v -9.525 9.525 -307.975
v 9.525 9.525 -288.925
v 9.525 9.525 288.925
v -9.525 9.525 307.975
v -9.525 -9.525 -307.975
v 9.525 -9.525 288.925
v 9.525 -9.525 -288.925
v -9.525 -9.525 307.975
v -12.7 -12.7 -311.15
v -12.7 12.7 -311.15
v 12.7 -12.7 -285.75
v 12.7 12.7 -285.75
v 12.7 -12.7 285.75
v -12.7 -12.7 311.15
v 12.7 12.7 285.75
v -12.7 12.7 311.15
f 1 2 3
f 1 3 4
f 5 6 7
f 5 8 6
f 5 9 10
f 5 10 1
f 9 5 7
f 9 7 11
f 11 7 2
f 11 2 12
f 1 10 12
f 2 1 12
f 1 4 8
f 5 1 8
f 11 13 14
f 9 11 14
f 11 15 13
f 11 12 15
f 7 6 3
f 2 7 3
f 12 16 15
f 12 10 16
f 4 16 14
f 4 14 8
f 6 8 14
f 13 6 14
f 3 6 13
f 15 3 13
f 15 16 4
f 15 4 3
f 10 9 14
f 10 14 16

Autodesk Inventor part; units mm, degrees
ref_plane "YZ Plane" through (0, 0, 0) normal (1, 0, 0) x (0, 1, 0)
ref_plane "XZ Plane" through (0, 0, 0) normal (0, 1, 0) x (-1, 0, 0)
ref_plane "XY Plane" through (0, 0, 0) normal (0, 0, 1) x (1, 0, 0)
sketch "Sketch1" plane through (0, 0, 0) normal (0, 0, 1) x (1, 0, 0)
  line L0 (-17.78, 0) -> (17.78, 0) projected
  line L1 (0, -17.78) -> (0, 17.78) projected
  line L2 (-12.7, 12.7) -> (12.7, 12.7)
  line L3 (12.7, 12.7) -> (12.7, -12.7)
  line L4 (12.7, -12.7) -> (-12.7, -12.7)
  line L5 (-12.7, -12.7) -> (-12.7, 12.7)
  line L6 (9.525, 9.525) -> (-9.525, 9.525)
  line L7 (-9.525, 9.525) -> (-9.525, -9.525)
  line L8 (-9.525, -9.525) -> (9.525, -9.525)
  line L9 (9.525, -9.525) -> (9.525, 9.525)
  point P0 (0, 0)
  point P1 (-12.7, 0)
  point P2 (0, 12.7)
  dimension "d0" = 25.4
  dimension "d1" = 3.175
extrude "Extrusion1" add sketch "Sketch1" along normal mid plane 622.3 contours L5 L2 L1 L6 L7 L0 | L0 L7 L8 L1 L4 L5 | L1 L8 L9 L0 L3 L4 | L2 L3 L0 L9 L6 L1
sketch "Sketch3" plane through (-12.7, 12.7, 311.15) normal (0, 1, 0) x (1, 0, 0)
  line L0 (0, 0) -> (25.4, 0) projected
  line L1 (25.4, 0) -> (25.4, 622.3) projected
  line L2 (0, 622.3) -> (0, 0) projected
  line L3 (0, 311.15) -> (25.4, 311.15) construction
  line L4 (0, 0) -> (25.4, 25.4)
  line L5 (25.4, 0) -> (25.4, 25.4)
  line L6 (0, 0) -> (25.4, 0)
  line L7 (0, 622.3) -> (25.4, 596.9)
  line L8 (25.4, 622.3) -> (25.4, 596.9)
  line L9 (0, 622.3) -> (25.4, 622.3)
  point P0 (12.7, 311.15)
  dimension "d7" = 45
extrude "Extrusion3" cut sketch "Sketch3" against normal through all contours L4 L1 L0 | L9 L1 L7
properties part number "tubing_template_0.125" material "Aluminum-6061"
